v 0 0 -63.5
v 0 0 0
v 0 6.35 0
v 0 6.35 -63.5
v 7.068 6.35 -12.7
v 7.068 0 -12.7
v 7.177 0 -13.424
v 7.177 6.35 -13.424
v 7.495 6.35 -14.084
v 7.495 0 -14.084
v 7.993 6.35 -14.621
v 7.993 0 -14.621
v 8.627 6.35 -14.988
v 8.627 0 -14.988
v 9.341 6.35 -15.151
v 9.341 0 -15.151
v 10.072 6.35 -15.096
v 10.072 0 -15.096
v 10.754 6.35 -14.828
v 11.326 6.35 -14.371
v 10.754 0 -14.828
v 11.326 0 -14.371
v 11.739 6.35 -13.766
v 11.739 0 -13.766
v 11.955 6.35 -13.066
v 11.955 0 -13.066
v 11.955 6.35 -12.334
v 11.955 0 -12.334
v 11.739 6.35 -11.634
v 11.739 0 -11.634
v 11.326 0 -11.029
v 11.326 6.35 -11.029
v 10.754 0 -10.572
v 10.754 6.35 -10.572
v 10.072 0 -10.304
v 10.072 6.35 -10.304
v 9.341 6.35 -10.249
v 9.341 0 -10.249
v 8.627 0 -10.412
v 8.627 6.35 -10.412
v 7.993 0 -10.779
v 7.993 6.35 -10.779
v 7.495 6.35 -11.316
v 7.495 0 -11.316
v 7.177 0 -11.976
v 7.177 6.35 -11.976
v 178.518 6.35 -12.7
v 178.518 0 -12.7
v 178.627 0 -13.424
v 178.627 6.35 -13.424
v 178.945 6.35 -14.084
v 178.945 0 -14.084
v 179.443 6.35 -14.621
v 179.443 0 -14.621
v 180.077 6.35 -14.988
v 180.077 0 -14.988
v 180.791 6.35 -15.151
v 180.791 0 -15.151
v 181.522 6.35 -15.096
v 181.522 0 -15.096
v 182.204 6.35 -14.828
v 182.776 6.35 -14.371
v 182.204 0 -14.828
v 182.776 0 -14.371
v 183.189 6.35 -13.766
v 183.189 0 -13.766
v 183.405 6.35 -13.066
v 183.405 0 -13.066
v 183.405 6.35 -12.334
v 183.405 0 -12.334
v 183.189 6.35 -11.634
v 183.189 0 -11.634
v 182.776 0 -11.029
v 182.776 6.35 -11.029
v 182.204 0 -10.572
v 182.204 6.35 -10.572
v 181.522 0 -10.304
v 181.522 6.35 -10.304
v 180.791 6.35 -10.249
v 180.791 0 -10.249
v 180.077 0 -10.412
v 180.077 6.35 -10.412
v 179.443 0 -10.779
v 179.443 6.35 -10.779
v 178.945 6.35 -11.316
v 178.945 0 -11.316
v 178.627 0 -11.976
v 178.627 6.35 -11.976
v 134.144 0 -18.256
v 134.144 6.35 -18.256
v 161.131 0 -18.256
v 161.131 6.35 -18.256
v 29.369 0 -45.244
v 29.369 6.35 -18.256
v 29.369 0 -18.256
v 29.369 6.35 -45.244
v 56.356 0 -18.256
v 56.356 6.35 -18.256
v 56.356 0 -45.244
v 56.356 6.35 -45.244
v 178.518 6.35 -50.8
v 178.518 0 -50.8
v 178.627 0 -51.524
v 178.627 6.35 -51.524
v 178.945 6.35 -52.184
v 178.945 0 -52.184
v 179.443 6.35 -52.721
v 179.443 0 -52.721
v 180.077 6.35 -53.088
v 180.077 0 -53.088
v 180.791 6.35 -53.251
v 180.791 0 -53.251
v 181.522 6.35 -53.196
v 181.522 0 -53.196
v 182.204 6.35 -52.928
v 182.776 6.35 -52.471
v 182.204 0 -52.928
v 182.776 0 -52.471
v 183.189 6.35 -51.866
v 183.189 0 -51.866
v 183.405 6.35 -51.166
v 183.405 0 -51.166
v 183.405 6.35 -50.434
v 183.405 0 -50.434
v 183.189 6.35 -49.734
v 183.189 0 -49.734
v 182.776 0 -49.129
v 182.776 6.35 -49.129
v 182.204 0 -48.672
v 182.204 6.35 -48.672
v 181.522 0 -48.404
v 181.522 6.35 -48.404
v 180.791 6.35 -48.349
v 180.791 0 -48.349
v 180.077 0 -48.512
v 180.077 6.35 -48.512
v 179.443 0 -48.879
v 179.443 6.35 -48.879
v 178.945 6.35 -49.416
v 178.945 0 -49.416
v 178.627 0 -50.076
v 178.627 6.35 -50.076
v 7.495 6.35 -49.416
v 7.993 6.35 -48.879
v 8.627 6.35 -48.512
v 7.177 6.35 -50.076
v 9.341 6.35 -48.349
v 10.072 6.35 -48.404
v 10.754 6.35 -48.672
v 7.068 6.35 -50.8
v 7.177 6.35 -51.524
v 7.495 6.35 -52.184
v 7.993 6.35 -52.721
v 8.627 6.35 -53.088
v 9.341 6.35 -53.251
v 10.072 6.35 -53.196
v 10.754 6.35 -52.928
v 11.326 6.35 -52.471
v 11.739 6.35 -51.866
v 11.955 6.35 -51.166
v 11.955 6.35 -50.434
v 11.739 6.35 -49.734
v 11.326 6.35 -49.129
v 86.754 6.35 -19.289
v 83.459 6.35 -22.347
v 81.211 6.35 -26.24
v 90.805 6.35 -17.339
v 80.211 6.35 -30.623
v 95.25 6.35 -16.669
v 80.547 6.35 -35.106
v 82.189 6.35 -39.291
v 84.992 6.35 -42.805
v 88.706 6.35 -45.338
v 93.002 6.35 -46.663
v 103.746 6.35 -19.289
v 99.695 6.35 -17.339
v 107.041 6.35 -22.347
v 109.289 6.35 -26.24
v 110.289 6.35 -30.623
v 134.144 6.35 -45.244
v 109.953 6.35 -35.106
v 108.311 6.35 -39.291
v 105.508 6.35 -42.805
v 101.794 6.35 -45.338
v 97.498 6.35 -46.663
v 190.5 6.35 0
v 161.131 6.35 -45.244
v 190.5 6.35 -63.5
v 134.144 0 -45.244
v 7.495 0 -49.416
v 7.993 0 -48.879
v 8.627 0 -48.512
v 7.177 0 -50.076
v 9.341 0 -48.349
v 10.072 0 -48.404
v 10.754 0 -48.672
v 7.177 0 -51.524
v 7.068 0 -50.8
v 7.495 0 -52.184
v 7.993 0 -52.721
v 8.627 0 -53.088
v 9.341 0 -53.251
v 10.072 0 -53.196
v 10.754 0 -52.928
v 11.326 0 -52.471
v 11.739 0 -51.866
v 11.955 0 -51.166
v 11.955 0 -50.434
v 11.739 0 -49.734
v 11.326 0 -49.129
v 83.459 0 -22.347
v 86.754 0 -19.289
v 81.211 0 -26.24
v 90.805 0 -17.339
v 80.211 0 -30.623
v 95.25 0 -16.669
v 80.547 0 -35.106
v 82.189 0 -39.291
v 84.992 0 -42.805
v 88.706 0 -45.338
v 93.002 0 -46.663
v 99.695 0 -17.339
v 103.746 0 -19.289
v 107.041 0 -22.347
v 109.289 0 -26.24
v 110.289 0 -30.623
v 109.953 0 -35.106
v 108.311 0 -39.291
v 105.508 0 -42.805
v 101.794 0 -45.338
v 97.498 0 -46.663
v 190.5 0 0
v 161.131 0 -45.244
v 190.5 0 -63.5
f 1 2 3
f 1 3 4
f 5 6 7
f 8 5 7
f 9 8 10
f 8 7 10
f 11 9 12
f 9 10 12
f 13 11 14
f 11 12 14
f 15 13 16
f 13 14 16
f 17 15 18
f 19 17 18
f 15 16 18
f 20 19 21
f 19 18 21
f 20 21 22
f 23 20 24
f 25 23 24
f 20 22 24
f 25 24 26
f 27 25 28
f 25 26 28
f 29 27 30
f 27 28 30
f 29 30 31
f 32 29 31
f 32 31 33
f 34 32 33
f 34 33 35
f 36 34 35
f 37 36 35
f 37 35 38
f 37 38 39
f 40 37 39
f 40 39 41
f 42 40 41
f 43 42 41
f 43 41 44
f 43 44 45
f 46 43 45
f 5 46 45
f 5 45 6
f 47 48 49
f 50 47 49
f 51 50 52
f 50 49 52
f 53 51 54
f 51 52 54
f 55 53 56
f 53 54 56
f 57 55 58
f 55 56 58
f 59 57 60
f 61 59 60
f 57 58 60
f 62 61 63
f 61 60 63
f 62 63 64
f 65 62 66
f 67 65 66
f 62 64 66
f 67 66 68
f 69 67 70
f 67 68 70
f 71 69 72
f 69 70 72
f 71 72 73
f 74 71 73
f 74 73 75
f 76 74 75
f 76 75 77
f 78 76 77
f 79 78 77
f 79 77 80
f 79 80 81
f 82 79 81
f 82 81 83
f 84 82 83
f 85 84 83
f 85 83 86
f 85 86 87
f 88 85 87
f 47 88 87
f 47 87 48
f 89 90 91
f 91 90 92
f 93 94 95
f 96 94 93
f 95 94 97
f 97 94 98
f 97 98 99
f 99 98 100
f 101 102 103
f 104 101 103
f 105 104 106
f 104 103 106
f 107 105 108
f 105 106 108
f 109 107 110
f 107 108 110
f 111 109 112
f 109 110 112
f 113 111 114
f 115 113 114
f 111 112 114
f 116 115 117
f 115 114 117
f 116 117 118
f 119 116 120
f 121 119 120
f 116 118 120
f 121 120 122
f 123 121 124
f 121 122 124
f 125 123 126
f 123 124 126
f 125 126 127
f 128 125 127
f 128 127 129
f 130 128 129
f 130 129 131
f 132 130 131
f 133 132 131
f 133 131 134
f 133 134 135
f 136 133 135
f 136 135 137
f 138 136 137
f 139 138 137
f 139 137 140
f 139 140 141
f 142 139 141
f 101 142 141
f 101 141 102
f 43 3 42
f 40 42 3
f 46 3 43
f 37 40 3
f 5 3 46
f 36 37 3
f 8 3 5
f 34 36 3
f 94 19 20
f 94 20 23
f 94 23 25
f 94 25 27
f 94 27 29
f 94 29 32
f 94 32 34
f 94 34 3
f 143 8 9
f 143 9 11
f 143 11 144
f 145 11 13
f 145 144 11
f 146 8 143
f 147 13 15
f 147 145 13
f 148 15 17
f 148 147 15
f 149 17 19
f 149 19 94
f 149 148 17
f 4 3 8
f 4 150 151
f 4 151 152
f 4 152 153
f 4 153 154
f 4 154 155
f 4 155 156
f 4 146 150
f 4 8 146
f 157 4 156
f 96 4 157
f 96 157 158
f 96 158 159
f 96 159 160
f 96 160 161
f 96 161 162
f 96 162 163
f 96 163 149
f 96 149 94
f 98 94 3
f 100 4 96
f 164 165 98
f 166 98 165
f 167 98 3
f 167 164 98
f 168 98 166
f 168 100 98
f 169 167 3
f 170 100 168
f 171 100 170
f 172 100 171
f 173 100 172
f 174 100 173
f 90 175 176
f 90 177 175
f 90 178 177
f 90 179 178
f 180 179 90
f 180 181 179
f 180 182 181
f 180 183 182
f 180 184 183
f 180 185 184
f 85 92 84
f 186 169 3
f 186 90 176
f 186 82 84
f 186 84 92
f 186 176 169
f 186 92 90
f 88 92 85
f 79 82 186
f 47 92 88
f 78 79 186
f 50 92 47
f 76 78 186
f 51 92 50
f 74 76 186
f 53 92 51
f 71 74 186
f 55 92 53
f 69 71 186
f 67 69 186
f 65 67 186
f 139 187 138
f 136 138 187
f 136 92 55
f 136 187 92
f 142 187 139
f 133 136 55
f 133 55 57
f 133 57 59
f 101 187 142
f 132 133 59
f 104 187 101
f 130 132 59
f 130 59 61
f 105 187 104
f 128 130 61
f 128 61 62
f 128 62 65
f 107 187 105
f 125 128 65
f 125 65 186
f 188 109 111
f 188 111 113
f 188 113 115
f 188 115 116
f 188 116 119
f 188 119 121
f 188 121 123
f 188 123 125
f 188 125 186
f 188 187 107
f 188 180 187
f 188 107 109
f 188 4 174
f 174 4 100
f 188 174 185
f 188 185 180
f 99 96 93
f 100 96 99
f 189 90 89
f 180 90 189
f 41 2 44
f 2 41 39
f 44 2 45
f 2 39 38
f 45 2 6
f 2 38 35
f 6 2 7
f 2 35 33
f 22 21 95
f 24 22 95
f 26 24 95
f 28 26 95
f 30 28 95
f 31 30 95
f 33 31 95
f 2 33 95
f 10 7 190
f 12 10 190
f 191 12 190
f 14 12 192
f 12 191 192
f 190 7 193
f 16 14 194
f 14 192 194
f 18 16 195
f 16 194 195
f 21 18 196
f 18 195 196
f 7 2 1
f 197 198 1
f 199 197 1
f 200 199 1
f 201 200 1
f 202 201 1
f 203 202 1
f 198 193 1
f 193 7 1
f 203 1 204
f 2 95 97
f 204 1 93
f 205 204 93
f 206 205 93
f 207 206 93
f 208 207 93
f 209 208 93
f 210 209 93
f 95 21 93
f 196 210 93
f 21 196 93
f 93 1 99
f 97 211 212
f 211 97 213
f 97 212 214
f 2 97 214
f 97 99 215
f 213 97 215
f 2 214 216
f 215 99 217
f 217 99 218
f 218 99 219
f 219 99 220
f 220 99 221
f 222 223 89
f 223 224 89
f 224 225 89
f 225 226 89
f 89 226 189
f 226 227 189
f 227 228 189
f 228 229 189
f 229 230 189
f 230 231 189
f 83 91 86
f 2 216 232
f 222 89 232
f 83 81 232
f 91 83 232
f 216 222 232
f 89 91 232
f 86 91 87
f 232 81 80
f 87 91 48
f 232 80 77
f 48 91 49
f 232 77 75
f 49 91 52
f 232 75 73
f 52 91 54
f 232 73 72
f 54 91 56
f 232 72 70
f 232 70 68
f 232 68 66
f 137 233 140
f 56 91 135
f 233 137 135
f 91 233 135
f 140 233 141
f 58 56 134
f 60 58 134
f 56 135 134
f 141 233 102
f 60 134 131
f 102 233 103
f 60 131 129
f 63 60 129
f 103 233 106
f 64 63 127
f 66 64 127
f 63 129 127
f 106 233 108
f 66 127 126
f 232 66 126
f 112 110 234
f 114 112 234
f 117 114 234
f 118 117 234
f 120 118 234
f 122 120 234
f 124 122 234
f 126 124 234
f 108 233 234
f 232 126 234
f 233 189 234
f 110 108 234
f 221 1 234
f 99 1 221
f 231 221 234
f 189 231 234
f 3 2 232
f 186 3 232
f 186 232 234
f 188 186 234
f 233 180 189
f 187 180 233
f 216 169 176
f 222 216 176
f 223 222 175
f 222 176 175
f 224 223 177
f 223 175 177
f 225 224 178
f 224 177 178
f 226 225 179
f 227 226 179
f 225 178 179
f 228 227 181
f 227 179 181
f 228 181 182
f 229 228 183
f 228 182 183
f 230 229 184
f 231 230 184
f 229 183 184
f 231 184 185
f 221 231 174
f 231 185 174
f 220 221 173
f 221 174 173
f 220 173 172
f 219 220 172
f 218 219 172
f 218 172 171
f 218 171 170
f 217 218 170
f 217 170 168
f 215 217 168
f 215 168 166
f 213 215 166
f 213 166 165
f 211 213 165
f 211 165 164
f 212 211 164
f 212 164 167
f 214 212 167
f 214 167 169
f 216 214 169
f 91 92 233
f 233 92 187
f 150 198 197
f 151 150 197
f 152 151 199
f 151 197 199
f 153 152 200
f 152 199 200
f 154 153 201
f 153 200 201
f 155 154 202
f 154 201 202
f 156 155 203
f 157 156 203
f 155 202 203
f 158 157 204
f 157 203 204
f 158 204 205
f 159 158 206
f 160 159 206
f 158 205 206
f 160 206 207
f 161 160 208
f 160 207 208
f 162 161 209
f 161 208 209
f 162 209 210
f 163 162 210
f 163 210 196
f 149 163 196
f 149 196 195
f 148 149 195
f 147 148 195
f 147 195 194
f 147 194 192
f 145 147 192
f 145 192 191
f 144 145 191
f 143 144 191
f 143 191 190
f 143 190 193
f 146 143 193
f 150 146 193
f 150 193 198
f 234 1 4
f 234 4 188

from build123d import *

# Parameters (mm, degrees)
SKETCH1_W                    = 190.5
SKETCH1_H                    = 63.5
BOSS_EXTRUDE1_DEPTH          = 6.35
SKETCH3_W                    = 26.9875
SKETCH3_H                    = 26.9875
CUT_EXTRUDE2_DEPTH           = 201.905008648
SKETCH4_W                    = 26.9875
SKETCH4_H                    = 26.9875
CUT_EXTRUDE3_DEPTH           = 201.905008648
SKETCH5_R                    = 15.08125
CUT_EXTRUDE4_DEPTH           = 201.905008648
F_10_0_1935_DIAMETER_HOLE1_D = 4.9149


with BuildPart() as part:
    # Sketch1 → Boss-Extrude1 (new body)
    with BuildSketch(Plane(origin=(0, 0, 0), x_dir=(1, 0, 0), z_dir=(0, 1, 0))):
        with Locations((95.25, 31.75)):
            Rectangle(SKETCH1_W, SKETCH1_H)
    extrude(amount=BOSS_EXTRUDE1_DEPTH)

    # Sketch3 → Cut-Extrude2 (cut, through all)
    with BuildSketch(Plane(origin=(0, 6.35, 0), x_dir=(1, 0, 0), z_dir=(0, 1, 0))):
        with Locations((42.8625, 31.75)):
            Rectangle(SKETCH3_W, SKETCH3_H)
    extrude(amount=-CUT_EXTRUDE2_DEPTH, mode=Mode.SUBTRACT)

    # Sketch4 → Cut-Extrude3 (cut, through all)
    with BuildSketch(Plane(origin=(0, 6.35, 0), x_dir=(1, 0, 0), z_dir=(0, 1, 0))):
        with Locations((147.6375, 31.75)):
            Rectangle(SKETCH4_W, SKETCH4_H)
    extrude(amount=-CUT_EXTRUDE3_DEPTH, mode=Mode.SUBTRACT)

    # Sketch5 → Cut-Extrude4 (cut, through all)
    with BuildSketch(Plane(origin=(0, 6.35, 0), x_dir=(1, 0, 0), z_dir=(0, 1, 0))):
        with Locations(Location((95.25, 31.75, 0), (0, 0, 270))):
            Circle(SKETCH5_R)
    extrude(amount=-CUT_EXTRUDE4_DEPTH, mode=Mode.SUBTRACT)

    # #10 (0.1935) Diameter Hole1 (through all)
    with Locations(Plane(origin=(0, 6.35, 0), x_dir=(1, 0, 0), z_dir=(0, 1, 0))):
        with Locations((9.525, 50.8), (9.525, 12.7), (180.975, 12.7), (180.975, 50.8)):
            Hole(F_10_0_1935_DIAMETER_HOLE1_D / 2)


solid = part.part
